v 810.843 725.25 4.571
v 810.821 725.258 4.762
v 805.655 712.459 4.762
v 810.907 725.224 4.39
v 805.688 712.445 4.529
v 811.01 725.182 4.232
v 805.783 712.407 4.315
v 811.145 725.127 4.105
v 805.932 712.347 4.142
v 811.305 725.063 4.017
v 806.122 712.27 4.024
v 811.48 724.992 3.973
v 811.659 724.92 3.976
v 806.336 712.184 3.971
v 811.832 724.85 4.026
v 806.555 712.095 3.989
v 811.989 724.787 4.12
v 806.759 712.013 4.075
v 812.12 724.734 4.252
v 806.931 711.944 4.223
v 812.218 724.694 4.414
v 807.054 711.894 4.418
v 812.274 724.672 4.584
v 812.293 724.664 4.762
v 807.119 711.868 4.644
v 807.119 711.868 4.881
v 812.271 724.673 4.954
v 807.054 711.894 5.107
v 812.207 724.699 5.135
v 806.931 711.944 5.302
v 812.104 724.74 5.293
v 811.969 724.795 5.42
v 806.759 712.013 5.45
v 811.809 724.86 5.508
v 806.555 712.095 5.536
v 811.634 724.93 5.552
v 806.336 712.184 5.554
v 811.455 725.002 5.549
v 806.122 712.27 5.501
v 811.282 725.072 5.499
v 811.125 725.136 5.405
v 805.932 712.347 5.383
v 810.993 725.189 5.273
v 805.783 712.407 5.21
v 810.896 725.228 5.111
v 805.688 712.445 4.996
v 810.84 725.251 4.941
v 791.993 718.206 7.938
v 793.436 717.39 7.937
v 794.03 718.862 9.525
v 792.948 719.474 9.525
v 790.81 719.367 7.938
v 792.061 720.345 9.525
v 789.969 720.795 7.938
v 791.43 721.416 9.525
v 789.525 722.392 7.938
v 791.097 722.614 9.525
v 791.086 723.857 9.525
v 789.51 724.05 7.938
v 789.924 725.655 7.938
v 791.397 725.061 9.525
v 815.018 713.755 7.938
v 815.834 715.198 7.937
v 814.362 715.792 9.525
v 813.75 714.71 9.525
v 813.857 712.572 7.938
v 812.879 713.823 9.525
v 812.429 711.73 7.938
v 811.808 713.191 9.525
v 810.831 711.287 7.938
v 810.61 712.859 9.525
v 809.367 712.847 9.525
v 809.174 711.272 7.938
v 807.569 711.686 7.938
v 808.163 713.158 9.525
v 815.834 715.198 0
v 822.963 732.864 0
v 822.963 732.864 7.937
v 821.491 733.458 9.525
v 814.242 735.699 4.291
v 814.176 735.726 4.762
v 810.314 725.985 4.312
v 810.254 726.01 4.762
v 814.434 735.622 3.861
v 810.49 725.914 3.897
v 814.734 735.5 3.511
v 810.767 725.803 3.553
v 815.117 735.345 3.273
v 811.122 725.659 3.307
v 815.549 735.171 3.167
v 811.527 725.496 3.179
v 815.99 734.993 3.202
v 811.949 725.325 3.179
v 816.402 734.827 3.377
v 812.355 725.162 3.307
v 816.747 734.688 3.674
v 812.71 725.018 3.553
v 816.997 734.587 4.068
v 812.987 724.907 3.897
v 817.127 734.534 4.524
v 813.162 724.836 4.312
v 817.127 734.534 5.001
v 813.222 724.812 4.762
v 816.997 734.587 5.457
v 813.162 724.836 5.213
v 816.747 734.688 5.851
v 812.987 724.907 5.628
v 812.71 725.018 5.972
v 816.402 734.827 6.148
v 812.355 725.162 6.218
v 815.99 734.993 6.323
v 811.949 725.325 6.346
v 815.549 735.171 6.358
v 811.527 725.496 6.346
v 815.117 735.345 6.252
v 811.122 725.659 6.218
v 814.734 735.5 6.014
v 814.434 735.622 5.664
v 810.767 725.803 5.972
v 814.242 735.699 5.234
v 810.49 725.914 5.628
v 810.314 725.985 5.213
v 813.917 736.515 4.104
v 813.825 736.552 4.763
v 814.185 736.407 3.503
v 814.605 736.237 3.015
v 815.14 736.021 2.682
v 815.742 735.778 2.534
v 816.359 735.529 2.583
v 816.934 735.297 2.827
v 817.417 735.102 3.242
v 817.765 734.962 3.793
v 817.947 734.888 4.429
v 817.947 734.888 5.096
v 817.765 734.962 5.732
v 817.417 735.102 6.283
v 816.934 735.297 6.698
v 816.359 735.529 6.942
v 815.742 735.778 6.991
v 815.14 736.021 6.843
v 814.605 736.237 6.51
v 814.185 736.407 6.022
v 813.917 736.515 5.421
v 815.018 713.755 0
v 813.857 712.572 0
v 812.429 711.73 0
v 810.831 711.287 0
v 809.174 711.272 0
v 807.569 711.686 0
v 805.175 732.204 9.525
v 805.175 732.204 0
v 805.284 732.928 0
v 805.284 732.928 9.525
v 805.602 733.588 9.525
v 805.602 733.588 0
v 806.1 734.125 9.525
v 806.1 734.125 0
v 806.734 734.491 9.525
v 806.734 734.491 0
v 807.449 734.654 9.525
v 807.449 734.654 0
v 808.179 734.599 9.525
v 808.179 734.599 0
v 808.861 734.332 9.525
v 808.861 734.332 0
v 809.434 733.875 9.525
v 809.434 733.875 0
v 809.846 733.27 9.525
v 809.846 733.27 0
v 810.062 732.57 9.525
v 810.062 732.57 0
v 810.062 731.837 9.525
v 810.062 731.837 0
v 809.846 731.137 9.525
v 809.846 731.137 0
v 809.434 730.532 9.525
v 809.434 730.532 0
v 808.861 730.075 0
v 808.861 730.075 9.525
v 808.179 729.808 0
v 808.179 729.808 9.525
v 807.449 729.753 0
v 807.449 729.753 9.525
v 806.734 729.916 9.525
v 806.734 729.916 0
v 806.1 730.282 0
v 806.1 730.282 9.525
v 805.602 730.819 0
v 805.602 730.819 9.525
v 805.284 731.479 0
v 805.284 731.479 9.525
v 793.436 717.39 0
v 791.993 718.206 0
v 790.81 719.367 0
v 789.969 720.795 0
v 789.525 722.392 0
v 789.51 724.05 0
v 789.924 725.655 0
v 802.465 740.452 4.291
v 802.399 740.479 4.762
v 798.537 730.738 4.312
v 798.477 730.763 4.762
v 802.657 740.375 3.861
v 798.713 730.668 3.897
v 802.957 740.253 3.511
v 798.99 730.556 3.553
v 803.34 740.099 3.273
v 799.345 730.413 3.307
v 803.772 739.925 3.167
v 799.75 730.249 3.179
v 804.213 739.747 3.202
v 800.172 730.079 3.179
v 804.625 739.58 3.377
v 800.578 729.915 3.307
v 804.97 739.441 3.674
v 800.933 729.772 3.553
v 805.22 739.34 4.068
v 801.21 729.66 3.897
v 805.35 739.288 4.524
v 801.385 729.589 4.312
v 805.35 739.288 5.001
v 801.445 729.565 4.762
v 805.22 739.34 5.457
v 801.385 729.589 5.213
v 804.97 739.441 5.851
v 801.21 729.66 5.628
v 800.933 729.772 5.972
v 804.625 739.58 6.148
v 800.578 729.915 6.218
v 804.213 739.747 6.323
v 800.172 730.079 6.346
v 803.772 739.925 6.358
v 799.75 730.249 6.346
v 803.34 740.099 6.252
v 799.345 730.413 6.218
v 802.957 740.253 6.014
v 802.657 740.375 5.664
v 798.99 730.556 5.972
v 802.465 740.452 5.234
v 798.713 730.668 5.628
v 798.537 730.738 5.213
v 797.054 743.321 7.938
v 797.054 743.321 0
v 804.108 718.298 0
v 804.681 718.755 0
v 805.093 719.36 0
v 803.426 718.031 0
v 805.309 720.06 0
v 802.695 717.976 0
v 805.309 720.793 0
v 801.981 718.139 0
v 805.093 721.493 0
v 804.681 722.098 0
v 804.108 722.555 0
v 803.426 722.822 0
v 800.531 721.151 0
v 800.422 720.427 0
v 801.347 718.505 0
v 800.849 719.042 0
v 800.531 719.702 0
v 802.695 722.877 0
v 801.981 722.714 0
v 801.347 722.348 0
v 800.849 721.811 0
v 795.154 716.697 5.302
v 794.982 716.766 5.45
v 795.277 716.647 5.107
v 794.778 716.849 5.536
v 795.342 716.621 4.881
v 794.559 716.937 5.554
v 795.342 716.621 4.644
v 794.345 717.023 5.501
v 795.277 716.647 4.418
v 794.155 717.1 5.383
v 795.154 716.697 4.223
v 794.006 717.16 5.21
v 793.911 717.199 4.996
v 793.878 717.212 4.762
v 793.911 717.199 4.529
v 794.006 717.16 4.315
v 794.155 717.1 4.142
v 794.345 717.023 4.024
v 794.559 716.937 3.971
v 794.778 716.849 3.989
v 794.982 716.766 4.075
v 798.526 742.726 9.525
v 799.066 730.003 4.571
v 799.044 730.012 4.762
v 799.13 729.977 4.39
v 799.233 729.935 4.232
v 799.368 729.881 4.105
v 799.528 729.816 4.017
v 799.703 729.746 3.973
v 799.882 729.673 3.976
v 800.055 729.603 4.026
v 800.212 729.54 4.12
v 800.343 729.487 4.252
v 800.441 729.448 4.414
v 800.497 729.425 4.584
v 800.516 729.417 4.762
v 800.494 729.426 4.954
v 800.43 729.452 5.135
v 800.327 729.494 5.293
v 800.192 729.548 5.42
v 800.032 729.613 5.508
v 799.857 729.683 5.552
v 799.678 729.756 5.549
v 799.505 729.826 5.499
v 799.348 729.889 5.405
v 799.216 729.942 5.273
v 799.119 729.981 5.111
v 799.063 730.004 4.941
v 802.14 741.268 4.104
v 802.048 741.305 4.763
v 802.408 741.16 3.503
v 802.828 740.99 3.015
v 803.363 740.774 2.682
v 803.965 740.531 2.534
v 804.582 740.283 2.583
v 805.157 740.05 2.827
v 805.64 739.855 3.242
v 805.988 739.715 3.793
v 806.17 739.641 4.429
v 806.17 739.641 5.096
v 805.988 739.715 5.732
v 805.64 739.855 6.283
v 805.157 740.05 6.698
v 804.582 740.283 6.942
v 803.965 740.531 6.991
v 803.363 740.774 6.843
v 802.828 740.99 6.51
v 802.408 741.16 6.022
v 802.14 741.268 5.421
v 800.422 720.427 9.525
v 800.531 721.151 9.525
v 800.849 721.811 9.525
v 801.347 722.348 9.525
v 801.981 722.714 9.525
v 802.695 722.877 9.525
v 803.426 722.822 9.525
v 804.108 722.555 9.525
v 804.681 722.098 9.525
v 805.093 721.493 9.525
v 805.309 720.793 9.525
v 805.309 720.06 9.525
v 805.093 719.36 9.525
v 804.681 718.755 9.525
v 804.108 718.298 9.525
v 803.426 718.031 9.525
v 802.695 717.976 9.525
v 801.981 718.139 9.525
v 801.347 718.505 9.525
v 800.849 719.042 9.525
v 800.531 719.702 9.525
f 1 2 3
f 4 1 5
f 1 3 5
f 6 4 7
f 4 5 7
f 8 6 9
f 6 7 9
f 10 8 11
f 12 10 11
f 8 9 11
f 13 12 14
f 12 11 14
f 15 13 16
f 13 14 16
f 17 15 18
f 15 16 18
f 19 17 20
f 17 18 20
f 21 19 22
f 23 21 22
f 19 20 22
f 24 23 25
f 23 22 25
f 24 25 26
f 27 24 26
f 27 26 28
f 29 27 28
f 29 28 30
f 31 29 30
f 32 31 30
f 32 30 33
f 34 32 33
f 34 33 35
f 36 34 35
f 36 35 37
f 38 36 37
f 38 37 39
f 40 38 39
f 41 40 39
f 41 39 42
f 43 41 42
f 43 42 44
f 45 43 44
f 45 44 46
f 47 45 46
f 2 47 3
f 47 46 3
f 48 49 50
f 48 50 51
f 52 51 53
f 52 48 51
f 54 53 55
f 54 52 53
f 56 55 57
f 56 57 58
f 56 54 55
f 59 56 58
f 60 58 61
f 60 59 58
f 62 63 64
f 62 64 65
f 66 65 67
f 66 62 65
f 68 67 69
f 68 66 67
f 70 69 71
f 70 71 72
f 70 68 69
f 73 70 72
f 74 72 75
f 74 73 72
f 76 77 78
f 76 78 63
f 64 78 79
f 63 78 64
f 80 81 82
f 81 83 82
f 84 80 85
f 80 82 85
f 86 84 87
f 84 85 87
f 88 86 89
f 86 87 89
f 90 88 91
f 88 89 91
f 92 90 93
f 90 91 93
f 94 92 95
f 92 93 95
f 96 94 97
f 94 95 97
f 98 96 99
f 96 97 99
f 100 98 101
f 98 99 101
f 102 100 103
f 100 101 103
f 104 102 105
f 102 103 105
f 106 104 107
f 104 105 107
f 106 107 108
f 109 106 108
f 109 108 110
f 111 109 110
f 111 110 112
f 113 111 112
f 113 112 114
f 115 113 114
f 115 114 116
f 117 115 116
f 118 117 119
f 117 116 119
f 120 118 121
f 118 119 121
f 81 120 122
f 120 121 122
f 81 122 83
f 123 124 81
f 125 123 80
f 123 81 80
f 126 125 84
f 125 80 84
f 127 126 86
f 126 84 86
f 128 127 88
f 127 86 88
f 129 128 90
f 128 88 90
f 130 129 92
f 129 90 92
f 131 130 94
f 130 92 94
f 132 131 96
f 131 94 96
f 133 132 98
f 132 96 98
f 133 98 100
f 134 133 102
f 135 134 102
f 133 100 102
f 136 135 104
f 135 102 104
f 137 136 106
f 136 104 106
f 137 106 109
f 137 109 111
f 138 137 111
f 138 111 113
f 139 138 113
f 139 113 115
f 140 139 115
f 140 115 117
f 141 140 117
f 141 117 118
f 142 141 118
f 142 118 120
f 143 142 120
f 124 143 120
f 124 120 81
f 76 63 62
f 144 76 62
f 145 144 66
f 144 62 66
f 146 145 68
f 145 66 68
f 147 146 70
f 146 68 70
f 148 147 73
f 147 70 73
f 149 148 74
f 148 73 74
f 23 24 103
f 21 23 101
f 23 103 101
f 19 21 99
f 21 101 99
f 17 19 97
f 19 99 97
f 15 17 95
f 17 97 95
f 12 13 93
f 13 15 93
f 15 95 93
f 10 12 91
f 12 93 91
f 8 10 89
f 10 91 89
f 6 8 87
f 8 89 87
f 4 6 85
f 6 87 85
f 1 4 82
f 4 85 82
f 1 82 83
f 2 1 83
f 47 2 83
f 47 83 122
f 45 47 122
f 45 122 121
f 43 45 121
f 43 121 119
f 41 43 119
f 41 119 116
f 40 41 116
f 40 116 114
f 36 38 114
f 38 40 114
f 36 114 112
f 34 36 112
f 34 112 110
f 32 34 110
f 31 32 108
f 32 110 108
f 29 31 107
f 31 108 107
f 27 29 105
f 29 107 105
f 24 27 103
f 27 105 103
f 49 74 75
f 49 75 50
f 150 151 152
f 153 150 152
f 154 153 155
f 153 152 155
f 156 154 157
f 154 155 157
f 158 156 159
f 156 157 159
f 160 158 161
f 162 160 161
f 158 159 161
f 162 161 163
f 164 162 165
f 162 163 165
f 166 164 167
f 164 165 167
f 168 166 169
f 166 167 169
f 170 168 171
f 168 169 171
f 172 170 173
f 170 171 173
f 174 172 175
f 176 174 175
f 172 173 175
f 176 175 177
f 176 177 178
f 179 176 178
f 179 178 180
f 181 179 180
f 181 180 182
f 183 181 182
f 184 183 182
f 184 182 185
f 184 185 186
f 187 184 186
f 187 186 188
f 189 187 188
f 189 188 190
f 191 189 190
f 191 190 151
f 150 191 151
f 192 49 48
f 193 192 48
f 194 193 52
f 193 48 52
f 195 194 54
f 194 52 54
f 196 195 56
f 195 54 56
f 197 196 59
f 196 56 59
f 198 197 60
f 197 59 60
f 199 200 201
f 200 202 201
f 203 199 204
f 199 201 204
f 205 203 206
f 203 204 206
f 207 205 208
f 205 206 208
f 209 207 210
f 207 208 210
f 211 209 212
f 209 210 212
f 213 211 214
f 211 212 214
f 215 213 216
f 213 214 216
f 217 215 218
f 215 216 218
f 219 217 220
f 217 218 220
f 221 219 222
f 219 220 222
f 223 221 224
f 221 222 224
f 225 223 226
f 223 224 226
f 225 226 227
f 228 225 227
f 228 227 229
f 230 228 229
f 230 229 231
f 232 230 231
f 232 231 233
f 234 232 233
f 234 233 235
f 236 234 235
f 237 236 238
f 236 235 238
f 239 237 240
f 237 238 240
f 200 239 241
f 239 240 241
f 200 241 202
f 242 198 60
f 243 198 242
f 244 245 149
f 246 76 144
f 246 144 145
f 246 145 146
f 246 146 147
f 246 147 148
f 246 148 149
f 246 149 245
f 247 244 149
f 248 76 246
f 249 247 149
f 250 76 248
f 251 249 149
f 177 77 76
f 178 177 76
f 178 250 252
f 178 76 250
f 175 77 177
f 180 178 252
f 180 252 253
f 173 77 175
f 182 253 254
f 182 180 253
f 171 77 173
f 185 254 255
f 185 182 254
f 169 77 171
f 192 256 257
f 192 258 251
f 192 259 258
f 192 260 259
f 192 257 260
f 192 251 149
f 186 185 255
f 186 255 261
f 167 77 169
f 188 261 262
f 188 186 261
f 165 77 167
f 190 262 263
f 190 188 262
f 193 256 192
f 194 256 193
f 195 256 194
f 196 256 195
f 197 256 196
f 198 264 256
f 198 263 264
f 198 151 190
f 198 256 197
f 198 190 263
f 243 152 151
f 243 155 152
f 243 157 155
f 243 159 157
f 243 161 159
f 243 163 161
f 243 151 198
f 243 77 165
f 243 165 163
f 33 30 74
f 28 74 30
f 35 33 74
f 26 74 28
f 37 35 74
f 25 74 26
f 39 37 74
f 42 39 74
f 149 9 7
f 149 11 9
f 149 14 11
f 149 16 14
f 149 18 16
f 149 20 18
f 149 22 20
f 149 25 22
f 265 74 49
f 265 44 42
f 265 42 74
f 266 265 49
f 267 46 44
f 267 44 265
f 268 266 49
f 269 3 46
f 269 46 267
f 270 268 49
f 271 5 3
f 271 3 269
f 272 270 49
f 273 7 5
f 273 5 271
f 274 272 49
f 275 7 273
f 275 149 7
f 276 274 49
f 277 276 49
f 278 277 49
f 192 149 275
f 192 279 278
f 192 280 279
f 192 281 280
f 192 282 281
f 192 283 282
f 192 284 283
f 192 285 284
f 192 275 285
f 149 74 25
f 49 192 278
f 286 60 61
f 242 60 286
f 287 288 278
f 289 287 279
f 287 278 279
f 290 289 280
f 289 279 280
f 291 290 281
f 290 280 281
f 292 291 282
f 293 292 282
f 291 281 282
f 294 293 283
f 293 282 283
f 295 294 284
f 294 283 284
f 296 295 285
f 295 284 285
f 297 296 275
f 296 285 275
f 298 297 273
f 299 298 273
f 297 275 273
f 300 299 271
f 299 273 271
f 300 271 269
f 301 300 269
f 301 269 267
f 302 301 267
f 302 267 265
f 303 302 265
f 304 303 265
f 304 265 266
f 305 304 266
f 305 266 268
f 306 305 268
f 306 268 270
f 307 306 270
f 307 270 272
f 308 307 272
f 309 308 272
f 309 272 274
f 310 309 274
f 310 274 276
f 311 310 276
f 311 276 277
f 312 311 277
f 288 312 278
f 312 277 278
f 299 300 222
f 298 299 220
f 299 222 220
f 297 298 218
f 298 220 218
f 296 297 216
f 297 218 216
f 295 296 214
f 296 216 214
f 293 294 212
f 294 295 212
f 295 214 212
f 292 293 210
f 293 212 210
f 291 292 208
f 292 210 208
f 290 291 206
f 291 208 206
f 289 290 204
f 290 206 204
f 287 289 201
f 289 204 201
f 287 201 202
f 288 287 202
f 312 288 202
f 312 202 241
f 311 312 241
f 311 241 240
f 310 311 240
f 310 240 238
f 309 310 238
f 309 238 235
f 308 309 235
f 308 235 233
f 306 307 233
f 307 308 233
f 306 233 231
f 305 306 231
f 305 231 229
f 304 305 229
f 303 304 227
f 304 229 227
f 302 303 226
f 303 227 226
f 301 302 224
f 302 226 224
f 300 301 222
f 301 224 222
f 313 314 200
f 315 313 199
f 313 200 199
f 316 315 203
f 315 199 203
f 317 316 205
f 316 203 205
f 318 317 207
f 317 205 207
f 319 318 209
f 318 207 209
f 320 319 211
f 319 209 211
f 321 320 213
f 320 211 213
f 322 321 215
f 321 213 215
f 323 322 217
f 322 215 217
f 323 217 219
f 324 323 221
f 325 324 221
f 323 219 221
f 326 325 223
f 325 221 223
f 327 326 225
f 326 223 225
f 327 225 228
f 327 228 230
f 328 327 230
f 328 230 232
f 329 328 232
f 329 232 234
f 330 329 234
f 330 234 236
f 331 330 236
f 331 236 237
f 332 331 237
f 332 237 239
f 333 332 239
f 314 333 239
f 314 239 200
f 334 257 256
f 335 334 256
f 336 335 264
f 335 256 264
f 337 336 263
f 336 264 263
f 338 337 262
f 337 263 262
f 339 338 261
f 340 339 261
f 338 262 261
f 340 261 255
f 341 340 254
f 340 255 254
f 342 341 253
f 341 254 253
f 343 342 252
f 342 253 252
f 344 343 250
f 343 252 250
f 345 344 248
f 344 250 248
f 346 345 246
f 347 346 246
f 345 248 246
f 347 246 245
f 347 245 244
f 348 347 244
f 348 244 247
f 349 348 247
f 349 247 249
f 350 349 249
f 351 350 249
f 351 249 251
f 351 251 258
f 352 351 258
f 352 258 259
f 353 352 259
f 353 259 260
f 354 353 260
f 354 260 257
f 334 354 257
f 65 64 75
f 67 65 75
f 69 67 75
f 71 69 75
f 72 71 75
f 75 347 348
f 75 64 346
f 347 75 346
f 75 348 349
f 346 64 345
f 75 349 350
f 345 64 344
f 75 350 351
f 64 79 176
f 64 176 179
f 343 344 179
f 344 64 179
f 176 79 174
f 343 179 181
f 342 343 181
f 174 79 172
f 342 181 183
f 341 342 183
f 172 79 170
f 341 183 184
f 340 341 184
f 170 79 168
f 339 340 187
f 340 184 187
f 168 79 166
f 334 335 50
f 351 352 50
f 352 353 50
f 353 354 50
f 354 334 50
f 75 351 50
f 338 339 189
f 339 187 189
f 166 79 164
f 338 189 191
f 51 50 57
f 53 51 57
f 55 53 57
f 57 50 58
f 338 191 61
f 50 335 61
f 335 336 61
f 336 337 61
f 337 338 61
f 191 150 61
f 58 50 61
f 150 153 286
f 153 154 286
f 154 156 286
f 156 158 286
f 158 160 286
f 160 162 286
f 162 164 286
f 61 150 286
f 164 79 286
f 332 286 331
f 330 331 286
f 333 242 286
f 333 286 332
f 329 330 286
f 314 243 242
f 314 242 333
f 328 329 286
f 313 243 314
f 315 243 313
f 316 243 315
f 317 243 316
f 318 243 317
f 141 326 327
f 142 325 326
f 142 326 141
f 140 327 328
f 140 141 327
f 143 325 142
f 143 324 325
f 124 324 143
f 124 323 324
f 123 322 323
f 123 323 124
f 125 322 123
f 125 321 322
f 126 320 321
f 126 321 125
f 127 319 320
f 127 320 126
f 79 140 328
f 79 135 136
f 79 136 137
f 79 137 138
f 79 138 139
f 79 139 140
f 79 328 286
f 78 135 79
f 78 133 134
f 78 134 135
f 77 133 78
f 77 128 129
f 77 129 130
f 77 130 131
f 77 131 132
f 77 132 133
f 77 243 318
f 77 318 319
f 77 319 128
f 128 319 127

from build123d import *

# Parameters (mm, degrees)
BOSS_EXTRUDE1_DEPTH                 = 9.525
FILLET1_R                           = 6.35
CHAMFER3_SIZE                       = 1.5875
F_1_8_0_126_DOWEL_HOLE1_D           = 3.2004
F_1_8_0_126_DOWEL_HOLE1_DEPTH       = 11.1125
F_1_8_0_126_DOWEL_HOLE1_CSINK_D     = 4.4704
F_1_8_0_126_DOWEL_HOLE1_CSINK_ANGLE = 90
F_1_8_0_126_DOWEL_HOLE1_TIP         = 0.961497163
F_1_16_0_0625_DIAMETER_HOLE1_D      = 1.5875
F_8_CLEARANCE_HOLE1_D               = 4.9149


with BuildPart() as part:
    # Sketch1 → Boss-Extrude1 (new body)
    with BuildSketch(Plane.XY):
        Polygon((822.963473633, 732.863646666), (813.457215496, 709.309643689), (787.547812221, 719.76652764), (797.054070358, 743.320530617), align=None)
    extrude(amount=BOSS_EXTRUDE1_DEPTH)

    # Fillet1
    fillet1_edges = [part.edges().sort_by_distance(p)[0] for p in [
        (813.457215496, 709.309643689, 4.7625),
        (787.547812221, 719.76652764, 4.7625),
    ]]
    fillet(fillet1_edges, radius=FILLET1_R)

    # Chamfer3
    chamfer3_edges = [part.edges().sort_by_distance(p)[0] for p in [
        (800.502513859, 714.538085664, 9.525),
        (819.398626831, 724.03089555, 9.525),
        (812.428593195, 711.730425262, 9.525),
        (789.968593794, 720.795149941, 9.525),
        (793.489223557, 734.4877795, 9.525),
    ]]
    chamfer(chamfer3_edges, length=CHAMFER3_SIZE)

    # 1/8 (0.126) Dowel Hole1
    with Locations(Plane(origin=(369.623280938, 915.829102682, 0), x_dir=(0.9273229518431505, -0.3742621313797403, 0), z_dir=(0.3742621313797403, 0.9273229518431505, 0))):
        with Locations((481.249807216, -4.7625), (468.549807216, -4.7625)):
            CounterSinkHole(F_1_8_0_126_DOWEL_HOLE1_D / 2, F_1_8_0_126_DOWEL_HOLE1_CSINK_D / 2, depth=F_1_8_0_126_DOWEL_HOLE1_DEPTH, counter_sink_angle=F_1_8_0_126_DOWEL_HOLE1_CSINK_ANGLE)
            with Locations((0, 0, -(F_1_8_0_126_DOWEL_HOLE1_DEPTH + F_1_8_0_126_DOWEL_HOLE1_TIP / 2))):  # 118° drill point
                Cone(0, F_1_8_0_126_DOWEL_HOLE1_D / 2, F_1_8_0_126_DOWEL_HOLE1_TIP, mode=Mode.SUBTRACT)

    # 1/16 (0.0625) Diameter Hole1 (through all)
    with Locations(Plane(origin=(369.623280938, 915.829102682, 0), x_dir=(0.9273229518431505, -0.3742621313797403, 0), z_dir=(0.3742621313797403, 0.9273229518431505, 0))):
        with Locations((468.549807216, -4.7625), (481.249807216, -4.7625)):
            Hole(F_1_16_0_0625_DIAMETER_HOLE1_D / 2)

    # #8 Clearance Hole1 (through all)
    with Locations(Plane.XY.offset(9.525)):
        with Locations((802.879078393, 720.426586409), (807.632207461, 732.203587897)):
            Hole(F_8_CLEARANCE_HOLE1_D / 2)


solid = part.part
